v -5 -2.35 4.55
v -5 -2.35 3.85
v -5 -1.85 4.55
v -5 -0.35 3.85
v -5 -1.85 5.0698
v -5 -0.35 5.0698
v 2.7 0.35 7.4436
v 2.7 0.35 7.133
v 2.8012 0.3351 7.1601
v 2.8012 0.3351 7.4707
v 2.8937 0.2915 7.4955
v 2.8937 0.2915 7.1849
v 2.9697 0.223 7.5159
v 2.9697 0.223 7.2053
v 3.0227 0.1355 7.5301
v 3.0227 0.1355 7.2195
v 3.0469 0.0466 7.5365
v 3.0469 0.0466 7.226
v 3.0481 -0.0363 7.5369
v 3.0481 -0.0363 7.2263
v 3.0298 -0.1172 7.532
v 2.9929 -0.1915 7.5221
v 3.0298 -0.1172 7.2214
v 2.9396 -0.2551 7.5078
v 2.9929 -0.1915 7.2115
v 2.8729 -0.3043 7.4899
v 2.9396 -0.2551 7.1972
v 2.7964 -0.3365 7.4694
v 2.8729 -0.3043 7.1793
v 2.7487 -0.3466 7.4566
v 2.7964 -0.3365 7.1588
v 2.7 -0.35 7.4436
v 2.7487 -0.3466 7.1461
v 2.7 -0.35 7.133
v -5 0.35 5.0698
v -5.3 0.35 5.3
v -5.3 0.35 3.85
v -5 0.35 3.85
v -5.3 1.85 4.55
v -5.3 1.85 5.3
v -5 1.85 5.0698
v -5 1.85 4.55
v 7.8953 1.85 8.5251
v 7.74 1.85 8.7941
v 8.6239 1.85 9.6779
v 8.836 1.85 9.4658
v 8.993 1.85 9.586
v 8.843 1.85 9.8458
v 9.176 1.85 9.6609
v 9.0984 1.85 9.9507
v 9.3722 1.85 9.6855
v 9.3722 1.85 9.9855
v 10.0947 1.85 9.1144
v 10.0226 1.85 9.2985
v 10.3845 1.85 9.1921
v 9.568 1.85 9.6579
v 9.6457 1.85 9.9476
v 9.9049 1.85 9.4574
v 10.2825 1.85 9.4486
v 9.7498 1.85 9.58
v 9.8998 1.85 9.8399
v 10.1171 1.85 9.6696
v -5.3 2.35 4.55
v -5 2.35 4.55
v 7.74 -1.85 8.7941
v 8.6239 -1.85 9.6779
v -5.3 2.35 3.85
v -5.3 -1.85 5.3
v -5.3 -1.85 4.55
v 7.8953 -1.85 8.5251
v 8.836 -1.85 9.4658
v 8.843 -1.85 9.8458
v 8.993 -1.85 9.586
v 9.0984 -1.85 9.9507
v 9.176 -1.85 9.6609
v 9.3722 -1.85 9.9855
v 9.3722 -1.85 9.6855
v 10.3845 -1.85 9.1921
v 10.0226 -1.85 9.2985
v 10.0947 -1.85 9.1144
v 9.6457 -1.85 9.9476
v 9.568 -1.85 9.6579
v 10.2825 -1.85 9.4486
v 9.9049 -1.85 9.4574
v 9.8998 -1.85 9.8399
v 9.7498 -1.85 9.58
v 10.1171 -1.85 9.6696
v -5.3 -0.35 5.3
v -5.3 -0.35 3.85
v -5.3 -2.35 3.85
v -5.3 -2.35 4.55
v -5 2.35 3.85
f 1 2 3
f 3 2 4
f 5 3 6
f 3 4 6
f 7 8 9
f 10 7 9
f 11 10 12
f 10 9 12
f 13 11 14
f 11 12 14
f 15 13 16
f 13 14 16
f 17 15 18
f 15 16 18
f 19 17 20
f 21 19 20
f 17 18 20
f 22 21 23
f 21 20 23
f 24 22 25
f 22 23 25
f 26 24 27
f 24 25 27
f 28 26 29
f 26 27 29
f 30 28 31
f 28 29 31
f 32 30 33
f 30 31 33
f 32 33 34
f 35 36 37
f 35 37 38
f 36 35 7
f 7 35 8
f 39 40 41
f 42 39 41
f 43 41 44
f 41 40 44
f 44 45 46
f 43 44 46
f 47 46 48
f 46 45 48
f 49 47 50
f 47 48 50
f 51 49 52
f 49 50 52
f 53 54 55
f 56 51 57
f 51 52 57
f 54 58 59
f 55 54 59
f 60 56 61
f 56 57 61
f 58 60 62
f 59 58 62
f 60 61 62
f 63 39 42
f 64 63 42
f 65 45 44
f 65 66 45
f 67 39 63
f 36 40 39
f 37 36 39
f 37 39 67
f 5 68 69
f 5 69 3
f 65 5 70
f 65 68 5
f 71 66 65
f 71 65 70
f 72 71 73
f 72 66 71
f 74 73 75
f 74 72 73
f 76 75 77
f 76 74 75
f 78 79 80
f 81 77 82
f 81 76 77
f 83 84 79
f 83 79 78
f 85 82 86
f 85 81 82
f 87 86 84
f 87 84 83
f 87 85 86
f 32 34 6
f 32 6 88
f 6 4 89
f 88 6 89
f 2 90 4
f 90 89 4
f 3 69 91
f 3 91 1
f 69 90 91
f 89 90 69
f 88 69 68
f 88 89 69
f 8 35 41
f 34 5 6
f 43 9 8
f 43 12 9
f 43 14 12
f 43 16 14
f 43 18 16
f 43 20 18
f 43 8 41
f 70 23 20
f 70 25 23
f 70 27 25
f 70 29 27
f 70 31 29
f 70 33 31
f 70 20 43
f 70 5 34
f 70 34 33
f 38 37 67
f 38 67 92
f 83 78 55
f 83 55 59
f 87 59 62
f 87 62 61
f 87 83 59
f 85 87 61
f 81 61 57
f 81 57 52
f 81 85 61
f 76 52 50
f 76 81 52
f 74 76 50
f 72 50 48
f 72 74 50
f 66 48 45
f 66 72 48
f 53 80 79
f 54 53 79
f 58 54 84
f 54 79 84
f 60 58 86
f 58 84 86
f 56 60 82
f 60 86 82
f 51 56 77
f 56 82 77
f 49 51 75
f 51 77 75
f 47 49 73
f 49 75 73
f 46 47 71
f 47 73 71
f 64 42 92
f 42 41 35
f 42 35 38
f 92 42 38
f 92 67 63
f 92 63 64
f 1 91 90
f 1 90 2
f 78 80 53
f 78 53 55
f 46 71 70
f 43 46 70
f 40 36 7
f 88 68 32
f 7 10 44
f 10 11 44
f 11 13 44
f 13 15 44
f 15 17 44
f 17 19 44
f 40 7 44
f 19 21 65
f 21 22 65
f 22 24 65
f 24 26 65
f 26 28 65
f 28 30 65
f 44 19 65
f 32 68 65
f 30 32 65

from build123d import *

# Parameters (mm, degrees)
PAD035_DEPTH    = 1.85
POCKET020_DEPTH = 6.136478
SKETCH051_W     = 0.3
SKETCH051_H     = 0.7
PAD036_DEPTH    = 0.5
SKETCH052_W     = 0.3
SKETCH052_H     = 0.7
PAD037_DEPTH    = 0.5


with BuildPart() as part:
    # Sketch049 → Pad035 (new body, symmetric)
    with BuildSketch(Plane.XZ):
        with BuildLine():
            Line((-5.3, 5.3), (-5.3, 3.85))
            Line((-5.3, 3.85), (-5, 3.85))
            Line((-5, 3.85), (-5, 5.069802))
            Line((-5, 5.069802), (7.89529, 8.525084))
            Line((8.836014, 9.465809), (7.89529, 8.525084))
            ThreePointArc((10.094687, 9.114411), (9.568018, 9.657855), (8.836014, 9.465809))
            Line((10.094687, 9.114411), (10.38451, 9.192069))
            ThreePointArc((10.38451, 9.192069), (9.645667, 9.947644), (8.623882, 9.677941))
            Line((8.623882, 9.677941), (7.739999, 8.794057))
            Line((-5.3, 5.3), (7.739999, 8.794057))
        make_face()
    extrude(amount=PAD035_DEPTH, both=True)

    # Sketch050 (on Face6 of Pad035) → Pocket020 (cut, through all)
    with BuildSketch(Plane(origin=(0, 0, 3.85), x_dir=(1, 0, 0), z_dir=(0, 0, -1))):
        with BuildLine():
            ThreePointArc((-5.3, 0.35), (-5.65, 0), (-5.3, -0.35))
            Line((-5.3, -0.35), (2.7, -0.35))
            ThreePointArc((2.7, -0.35), (3.05, 0), (2.7, 0.35))
            Line((2.7, 0.35), (-5.3, 0.35))
        make_face()
    extrude(amount=-POCKET020_DEPTH, mode=Mode.SUBTRACT)

    # Sketch051 (on Face5 of Pocket020) → Pad036 (join)
    with BuildSketch(Plane.XZ.offset(1.85)):
        with Locations((-5.15, 4.2)):
            Rectangle(SKETCH051_W, SKETCH051_H)
    extrude(amount=PAD036_DEPTH)

    # Sketch052 (on Face4 of Pad036) → Pad037 (join)
    with BuildSketch(Plane(origin=(0, 1.85, 0), x_dir=(1, 0, 0), z_dir=(0, 1, 0))):
        with Locations((-5.15, -4.2)):
            Rectangle(SKETCH052_W, SKETCH052_H)
    extrude(amount=PAD037_DEPTH)


solid = part.part
